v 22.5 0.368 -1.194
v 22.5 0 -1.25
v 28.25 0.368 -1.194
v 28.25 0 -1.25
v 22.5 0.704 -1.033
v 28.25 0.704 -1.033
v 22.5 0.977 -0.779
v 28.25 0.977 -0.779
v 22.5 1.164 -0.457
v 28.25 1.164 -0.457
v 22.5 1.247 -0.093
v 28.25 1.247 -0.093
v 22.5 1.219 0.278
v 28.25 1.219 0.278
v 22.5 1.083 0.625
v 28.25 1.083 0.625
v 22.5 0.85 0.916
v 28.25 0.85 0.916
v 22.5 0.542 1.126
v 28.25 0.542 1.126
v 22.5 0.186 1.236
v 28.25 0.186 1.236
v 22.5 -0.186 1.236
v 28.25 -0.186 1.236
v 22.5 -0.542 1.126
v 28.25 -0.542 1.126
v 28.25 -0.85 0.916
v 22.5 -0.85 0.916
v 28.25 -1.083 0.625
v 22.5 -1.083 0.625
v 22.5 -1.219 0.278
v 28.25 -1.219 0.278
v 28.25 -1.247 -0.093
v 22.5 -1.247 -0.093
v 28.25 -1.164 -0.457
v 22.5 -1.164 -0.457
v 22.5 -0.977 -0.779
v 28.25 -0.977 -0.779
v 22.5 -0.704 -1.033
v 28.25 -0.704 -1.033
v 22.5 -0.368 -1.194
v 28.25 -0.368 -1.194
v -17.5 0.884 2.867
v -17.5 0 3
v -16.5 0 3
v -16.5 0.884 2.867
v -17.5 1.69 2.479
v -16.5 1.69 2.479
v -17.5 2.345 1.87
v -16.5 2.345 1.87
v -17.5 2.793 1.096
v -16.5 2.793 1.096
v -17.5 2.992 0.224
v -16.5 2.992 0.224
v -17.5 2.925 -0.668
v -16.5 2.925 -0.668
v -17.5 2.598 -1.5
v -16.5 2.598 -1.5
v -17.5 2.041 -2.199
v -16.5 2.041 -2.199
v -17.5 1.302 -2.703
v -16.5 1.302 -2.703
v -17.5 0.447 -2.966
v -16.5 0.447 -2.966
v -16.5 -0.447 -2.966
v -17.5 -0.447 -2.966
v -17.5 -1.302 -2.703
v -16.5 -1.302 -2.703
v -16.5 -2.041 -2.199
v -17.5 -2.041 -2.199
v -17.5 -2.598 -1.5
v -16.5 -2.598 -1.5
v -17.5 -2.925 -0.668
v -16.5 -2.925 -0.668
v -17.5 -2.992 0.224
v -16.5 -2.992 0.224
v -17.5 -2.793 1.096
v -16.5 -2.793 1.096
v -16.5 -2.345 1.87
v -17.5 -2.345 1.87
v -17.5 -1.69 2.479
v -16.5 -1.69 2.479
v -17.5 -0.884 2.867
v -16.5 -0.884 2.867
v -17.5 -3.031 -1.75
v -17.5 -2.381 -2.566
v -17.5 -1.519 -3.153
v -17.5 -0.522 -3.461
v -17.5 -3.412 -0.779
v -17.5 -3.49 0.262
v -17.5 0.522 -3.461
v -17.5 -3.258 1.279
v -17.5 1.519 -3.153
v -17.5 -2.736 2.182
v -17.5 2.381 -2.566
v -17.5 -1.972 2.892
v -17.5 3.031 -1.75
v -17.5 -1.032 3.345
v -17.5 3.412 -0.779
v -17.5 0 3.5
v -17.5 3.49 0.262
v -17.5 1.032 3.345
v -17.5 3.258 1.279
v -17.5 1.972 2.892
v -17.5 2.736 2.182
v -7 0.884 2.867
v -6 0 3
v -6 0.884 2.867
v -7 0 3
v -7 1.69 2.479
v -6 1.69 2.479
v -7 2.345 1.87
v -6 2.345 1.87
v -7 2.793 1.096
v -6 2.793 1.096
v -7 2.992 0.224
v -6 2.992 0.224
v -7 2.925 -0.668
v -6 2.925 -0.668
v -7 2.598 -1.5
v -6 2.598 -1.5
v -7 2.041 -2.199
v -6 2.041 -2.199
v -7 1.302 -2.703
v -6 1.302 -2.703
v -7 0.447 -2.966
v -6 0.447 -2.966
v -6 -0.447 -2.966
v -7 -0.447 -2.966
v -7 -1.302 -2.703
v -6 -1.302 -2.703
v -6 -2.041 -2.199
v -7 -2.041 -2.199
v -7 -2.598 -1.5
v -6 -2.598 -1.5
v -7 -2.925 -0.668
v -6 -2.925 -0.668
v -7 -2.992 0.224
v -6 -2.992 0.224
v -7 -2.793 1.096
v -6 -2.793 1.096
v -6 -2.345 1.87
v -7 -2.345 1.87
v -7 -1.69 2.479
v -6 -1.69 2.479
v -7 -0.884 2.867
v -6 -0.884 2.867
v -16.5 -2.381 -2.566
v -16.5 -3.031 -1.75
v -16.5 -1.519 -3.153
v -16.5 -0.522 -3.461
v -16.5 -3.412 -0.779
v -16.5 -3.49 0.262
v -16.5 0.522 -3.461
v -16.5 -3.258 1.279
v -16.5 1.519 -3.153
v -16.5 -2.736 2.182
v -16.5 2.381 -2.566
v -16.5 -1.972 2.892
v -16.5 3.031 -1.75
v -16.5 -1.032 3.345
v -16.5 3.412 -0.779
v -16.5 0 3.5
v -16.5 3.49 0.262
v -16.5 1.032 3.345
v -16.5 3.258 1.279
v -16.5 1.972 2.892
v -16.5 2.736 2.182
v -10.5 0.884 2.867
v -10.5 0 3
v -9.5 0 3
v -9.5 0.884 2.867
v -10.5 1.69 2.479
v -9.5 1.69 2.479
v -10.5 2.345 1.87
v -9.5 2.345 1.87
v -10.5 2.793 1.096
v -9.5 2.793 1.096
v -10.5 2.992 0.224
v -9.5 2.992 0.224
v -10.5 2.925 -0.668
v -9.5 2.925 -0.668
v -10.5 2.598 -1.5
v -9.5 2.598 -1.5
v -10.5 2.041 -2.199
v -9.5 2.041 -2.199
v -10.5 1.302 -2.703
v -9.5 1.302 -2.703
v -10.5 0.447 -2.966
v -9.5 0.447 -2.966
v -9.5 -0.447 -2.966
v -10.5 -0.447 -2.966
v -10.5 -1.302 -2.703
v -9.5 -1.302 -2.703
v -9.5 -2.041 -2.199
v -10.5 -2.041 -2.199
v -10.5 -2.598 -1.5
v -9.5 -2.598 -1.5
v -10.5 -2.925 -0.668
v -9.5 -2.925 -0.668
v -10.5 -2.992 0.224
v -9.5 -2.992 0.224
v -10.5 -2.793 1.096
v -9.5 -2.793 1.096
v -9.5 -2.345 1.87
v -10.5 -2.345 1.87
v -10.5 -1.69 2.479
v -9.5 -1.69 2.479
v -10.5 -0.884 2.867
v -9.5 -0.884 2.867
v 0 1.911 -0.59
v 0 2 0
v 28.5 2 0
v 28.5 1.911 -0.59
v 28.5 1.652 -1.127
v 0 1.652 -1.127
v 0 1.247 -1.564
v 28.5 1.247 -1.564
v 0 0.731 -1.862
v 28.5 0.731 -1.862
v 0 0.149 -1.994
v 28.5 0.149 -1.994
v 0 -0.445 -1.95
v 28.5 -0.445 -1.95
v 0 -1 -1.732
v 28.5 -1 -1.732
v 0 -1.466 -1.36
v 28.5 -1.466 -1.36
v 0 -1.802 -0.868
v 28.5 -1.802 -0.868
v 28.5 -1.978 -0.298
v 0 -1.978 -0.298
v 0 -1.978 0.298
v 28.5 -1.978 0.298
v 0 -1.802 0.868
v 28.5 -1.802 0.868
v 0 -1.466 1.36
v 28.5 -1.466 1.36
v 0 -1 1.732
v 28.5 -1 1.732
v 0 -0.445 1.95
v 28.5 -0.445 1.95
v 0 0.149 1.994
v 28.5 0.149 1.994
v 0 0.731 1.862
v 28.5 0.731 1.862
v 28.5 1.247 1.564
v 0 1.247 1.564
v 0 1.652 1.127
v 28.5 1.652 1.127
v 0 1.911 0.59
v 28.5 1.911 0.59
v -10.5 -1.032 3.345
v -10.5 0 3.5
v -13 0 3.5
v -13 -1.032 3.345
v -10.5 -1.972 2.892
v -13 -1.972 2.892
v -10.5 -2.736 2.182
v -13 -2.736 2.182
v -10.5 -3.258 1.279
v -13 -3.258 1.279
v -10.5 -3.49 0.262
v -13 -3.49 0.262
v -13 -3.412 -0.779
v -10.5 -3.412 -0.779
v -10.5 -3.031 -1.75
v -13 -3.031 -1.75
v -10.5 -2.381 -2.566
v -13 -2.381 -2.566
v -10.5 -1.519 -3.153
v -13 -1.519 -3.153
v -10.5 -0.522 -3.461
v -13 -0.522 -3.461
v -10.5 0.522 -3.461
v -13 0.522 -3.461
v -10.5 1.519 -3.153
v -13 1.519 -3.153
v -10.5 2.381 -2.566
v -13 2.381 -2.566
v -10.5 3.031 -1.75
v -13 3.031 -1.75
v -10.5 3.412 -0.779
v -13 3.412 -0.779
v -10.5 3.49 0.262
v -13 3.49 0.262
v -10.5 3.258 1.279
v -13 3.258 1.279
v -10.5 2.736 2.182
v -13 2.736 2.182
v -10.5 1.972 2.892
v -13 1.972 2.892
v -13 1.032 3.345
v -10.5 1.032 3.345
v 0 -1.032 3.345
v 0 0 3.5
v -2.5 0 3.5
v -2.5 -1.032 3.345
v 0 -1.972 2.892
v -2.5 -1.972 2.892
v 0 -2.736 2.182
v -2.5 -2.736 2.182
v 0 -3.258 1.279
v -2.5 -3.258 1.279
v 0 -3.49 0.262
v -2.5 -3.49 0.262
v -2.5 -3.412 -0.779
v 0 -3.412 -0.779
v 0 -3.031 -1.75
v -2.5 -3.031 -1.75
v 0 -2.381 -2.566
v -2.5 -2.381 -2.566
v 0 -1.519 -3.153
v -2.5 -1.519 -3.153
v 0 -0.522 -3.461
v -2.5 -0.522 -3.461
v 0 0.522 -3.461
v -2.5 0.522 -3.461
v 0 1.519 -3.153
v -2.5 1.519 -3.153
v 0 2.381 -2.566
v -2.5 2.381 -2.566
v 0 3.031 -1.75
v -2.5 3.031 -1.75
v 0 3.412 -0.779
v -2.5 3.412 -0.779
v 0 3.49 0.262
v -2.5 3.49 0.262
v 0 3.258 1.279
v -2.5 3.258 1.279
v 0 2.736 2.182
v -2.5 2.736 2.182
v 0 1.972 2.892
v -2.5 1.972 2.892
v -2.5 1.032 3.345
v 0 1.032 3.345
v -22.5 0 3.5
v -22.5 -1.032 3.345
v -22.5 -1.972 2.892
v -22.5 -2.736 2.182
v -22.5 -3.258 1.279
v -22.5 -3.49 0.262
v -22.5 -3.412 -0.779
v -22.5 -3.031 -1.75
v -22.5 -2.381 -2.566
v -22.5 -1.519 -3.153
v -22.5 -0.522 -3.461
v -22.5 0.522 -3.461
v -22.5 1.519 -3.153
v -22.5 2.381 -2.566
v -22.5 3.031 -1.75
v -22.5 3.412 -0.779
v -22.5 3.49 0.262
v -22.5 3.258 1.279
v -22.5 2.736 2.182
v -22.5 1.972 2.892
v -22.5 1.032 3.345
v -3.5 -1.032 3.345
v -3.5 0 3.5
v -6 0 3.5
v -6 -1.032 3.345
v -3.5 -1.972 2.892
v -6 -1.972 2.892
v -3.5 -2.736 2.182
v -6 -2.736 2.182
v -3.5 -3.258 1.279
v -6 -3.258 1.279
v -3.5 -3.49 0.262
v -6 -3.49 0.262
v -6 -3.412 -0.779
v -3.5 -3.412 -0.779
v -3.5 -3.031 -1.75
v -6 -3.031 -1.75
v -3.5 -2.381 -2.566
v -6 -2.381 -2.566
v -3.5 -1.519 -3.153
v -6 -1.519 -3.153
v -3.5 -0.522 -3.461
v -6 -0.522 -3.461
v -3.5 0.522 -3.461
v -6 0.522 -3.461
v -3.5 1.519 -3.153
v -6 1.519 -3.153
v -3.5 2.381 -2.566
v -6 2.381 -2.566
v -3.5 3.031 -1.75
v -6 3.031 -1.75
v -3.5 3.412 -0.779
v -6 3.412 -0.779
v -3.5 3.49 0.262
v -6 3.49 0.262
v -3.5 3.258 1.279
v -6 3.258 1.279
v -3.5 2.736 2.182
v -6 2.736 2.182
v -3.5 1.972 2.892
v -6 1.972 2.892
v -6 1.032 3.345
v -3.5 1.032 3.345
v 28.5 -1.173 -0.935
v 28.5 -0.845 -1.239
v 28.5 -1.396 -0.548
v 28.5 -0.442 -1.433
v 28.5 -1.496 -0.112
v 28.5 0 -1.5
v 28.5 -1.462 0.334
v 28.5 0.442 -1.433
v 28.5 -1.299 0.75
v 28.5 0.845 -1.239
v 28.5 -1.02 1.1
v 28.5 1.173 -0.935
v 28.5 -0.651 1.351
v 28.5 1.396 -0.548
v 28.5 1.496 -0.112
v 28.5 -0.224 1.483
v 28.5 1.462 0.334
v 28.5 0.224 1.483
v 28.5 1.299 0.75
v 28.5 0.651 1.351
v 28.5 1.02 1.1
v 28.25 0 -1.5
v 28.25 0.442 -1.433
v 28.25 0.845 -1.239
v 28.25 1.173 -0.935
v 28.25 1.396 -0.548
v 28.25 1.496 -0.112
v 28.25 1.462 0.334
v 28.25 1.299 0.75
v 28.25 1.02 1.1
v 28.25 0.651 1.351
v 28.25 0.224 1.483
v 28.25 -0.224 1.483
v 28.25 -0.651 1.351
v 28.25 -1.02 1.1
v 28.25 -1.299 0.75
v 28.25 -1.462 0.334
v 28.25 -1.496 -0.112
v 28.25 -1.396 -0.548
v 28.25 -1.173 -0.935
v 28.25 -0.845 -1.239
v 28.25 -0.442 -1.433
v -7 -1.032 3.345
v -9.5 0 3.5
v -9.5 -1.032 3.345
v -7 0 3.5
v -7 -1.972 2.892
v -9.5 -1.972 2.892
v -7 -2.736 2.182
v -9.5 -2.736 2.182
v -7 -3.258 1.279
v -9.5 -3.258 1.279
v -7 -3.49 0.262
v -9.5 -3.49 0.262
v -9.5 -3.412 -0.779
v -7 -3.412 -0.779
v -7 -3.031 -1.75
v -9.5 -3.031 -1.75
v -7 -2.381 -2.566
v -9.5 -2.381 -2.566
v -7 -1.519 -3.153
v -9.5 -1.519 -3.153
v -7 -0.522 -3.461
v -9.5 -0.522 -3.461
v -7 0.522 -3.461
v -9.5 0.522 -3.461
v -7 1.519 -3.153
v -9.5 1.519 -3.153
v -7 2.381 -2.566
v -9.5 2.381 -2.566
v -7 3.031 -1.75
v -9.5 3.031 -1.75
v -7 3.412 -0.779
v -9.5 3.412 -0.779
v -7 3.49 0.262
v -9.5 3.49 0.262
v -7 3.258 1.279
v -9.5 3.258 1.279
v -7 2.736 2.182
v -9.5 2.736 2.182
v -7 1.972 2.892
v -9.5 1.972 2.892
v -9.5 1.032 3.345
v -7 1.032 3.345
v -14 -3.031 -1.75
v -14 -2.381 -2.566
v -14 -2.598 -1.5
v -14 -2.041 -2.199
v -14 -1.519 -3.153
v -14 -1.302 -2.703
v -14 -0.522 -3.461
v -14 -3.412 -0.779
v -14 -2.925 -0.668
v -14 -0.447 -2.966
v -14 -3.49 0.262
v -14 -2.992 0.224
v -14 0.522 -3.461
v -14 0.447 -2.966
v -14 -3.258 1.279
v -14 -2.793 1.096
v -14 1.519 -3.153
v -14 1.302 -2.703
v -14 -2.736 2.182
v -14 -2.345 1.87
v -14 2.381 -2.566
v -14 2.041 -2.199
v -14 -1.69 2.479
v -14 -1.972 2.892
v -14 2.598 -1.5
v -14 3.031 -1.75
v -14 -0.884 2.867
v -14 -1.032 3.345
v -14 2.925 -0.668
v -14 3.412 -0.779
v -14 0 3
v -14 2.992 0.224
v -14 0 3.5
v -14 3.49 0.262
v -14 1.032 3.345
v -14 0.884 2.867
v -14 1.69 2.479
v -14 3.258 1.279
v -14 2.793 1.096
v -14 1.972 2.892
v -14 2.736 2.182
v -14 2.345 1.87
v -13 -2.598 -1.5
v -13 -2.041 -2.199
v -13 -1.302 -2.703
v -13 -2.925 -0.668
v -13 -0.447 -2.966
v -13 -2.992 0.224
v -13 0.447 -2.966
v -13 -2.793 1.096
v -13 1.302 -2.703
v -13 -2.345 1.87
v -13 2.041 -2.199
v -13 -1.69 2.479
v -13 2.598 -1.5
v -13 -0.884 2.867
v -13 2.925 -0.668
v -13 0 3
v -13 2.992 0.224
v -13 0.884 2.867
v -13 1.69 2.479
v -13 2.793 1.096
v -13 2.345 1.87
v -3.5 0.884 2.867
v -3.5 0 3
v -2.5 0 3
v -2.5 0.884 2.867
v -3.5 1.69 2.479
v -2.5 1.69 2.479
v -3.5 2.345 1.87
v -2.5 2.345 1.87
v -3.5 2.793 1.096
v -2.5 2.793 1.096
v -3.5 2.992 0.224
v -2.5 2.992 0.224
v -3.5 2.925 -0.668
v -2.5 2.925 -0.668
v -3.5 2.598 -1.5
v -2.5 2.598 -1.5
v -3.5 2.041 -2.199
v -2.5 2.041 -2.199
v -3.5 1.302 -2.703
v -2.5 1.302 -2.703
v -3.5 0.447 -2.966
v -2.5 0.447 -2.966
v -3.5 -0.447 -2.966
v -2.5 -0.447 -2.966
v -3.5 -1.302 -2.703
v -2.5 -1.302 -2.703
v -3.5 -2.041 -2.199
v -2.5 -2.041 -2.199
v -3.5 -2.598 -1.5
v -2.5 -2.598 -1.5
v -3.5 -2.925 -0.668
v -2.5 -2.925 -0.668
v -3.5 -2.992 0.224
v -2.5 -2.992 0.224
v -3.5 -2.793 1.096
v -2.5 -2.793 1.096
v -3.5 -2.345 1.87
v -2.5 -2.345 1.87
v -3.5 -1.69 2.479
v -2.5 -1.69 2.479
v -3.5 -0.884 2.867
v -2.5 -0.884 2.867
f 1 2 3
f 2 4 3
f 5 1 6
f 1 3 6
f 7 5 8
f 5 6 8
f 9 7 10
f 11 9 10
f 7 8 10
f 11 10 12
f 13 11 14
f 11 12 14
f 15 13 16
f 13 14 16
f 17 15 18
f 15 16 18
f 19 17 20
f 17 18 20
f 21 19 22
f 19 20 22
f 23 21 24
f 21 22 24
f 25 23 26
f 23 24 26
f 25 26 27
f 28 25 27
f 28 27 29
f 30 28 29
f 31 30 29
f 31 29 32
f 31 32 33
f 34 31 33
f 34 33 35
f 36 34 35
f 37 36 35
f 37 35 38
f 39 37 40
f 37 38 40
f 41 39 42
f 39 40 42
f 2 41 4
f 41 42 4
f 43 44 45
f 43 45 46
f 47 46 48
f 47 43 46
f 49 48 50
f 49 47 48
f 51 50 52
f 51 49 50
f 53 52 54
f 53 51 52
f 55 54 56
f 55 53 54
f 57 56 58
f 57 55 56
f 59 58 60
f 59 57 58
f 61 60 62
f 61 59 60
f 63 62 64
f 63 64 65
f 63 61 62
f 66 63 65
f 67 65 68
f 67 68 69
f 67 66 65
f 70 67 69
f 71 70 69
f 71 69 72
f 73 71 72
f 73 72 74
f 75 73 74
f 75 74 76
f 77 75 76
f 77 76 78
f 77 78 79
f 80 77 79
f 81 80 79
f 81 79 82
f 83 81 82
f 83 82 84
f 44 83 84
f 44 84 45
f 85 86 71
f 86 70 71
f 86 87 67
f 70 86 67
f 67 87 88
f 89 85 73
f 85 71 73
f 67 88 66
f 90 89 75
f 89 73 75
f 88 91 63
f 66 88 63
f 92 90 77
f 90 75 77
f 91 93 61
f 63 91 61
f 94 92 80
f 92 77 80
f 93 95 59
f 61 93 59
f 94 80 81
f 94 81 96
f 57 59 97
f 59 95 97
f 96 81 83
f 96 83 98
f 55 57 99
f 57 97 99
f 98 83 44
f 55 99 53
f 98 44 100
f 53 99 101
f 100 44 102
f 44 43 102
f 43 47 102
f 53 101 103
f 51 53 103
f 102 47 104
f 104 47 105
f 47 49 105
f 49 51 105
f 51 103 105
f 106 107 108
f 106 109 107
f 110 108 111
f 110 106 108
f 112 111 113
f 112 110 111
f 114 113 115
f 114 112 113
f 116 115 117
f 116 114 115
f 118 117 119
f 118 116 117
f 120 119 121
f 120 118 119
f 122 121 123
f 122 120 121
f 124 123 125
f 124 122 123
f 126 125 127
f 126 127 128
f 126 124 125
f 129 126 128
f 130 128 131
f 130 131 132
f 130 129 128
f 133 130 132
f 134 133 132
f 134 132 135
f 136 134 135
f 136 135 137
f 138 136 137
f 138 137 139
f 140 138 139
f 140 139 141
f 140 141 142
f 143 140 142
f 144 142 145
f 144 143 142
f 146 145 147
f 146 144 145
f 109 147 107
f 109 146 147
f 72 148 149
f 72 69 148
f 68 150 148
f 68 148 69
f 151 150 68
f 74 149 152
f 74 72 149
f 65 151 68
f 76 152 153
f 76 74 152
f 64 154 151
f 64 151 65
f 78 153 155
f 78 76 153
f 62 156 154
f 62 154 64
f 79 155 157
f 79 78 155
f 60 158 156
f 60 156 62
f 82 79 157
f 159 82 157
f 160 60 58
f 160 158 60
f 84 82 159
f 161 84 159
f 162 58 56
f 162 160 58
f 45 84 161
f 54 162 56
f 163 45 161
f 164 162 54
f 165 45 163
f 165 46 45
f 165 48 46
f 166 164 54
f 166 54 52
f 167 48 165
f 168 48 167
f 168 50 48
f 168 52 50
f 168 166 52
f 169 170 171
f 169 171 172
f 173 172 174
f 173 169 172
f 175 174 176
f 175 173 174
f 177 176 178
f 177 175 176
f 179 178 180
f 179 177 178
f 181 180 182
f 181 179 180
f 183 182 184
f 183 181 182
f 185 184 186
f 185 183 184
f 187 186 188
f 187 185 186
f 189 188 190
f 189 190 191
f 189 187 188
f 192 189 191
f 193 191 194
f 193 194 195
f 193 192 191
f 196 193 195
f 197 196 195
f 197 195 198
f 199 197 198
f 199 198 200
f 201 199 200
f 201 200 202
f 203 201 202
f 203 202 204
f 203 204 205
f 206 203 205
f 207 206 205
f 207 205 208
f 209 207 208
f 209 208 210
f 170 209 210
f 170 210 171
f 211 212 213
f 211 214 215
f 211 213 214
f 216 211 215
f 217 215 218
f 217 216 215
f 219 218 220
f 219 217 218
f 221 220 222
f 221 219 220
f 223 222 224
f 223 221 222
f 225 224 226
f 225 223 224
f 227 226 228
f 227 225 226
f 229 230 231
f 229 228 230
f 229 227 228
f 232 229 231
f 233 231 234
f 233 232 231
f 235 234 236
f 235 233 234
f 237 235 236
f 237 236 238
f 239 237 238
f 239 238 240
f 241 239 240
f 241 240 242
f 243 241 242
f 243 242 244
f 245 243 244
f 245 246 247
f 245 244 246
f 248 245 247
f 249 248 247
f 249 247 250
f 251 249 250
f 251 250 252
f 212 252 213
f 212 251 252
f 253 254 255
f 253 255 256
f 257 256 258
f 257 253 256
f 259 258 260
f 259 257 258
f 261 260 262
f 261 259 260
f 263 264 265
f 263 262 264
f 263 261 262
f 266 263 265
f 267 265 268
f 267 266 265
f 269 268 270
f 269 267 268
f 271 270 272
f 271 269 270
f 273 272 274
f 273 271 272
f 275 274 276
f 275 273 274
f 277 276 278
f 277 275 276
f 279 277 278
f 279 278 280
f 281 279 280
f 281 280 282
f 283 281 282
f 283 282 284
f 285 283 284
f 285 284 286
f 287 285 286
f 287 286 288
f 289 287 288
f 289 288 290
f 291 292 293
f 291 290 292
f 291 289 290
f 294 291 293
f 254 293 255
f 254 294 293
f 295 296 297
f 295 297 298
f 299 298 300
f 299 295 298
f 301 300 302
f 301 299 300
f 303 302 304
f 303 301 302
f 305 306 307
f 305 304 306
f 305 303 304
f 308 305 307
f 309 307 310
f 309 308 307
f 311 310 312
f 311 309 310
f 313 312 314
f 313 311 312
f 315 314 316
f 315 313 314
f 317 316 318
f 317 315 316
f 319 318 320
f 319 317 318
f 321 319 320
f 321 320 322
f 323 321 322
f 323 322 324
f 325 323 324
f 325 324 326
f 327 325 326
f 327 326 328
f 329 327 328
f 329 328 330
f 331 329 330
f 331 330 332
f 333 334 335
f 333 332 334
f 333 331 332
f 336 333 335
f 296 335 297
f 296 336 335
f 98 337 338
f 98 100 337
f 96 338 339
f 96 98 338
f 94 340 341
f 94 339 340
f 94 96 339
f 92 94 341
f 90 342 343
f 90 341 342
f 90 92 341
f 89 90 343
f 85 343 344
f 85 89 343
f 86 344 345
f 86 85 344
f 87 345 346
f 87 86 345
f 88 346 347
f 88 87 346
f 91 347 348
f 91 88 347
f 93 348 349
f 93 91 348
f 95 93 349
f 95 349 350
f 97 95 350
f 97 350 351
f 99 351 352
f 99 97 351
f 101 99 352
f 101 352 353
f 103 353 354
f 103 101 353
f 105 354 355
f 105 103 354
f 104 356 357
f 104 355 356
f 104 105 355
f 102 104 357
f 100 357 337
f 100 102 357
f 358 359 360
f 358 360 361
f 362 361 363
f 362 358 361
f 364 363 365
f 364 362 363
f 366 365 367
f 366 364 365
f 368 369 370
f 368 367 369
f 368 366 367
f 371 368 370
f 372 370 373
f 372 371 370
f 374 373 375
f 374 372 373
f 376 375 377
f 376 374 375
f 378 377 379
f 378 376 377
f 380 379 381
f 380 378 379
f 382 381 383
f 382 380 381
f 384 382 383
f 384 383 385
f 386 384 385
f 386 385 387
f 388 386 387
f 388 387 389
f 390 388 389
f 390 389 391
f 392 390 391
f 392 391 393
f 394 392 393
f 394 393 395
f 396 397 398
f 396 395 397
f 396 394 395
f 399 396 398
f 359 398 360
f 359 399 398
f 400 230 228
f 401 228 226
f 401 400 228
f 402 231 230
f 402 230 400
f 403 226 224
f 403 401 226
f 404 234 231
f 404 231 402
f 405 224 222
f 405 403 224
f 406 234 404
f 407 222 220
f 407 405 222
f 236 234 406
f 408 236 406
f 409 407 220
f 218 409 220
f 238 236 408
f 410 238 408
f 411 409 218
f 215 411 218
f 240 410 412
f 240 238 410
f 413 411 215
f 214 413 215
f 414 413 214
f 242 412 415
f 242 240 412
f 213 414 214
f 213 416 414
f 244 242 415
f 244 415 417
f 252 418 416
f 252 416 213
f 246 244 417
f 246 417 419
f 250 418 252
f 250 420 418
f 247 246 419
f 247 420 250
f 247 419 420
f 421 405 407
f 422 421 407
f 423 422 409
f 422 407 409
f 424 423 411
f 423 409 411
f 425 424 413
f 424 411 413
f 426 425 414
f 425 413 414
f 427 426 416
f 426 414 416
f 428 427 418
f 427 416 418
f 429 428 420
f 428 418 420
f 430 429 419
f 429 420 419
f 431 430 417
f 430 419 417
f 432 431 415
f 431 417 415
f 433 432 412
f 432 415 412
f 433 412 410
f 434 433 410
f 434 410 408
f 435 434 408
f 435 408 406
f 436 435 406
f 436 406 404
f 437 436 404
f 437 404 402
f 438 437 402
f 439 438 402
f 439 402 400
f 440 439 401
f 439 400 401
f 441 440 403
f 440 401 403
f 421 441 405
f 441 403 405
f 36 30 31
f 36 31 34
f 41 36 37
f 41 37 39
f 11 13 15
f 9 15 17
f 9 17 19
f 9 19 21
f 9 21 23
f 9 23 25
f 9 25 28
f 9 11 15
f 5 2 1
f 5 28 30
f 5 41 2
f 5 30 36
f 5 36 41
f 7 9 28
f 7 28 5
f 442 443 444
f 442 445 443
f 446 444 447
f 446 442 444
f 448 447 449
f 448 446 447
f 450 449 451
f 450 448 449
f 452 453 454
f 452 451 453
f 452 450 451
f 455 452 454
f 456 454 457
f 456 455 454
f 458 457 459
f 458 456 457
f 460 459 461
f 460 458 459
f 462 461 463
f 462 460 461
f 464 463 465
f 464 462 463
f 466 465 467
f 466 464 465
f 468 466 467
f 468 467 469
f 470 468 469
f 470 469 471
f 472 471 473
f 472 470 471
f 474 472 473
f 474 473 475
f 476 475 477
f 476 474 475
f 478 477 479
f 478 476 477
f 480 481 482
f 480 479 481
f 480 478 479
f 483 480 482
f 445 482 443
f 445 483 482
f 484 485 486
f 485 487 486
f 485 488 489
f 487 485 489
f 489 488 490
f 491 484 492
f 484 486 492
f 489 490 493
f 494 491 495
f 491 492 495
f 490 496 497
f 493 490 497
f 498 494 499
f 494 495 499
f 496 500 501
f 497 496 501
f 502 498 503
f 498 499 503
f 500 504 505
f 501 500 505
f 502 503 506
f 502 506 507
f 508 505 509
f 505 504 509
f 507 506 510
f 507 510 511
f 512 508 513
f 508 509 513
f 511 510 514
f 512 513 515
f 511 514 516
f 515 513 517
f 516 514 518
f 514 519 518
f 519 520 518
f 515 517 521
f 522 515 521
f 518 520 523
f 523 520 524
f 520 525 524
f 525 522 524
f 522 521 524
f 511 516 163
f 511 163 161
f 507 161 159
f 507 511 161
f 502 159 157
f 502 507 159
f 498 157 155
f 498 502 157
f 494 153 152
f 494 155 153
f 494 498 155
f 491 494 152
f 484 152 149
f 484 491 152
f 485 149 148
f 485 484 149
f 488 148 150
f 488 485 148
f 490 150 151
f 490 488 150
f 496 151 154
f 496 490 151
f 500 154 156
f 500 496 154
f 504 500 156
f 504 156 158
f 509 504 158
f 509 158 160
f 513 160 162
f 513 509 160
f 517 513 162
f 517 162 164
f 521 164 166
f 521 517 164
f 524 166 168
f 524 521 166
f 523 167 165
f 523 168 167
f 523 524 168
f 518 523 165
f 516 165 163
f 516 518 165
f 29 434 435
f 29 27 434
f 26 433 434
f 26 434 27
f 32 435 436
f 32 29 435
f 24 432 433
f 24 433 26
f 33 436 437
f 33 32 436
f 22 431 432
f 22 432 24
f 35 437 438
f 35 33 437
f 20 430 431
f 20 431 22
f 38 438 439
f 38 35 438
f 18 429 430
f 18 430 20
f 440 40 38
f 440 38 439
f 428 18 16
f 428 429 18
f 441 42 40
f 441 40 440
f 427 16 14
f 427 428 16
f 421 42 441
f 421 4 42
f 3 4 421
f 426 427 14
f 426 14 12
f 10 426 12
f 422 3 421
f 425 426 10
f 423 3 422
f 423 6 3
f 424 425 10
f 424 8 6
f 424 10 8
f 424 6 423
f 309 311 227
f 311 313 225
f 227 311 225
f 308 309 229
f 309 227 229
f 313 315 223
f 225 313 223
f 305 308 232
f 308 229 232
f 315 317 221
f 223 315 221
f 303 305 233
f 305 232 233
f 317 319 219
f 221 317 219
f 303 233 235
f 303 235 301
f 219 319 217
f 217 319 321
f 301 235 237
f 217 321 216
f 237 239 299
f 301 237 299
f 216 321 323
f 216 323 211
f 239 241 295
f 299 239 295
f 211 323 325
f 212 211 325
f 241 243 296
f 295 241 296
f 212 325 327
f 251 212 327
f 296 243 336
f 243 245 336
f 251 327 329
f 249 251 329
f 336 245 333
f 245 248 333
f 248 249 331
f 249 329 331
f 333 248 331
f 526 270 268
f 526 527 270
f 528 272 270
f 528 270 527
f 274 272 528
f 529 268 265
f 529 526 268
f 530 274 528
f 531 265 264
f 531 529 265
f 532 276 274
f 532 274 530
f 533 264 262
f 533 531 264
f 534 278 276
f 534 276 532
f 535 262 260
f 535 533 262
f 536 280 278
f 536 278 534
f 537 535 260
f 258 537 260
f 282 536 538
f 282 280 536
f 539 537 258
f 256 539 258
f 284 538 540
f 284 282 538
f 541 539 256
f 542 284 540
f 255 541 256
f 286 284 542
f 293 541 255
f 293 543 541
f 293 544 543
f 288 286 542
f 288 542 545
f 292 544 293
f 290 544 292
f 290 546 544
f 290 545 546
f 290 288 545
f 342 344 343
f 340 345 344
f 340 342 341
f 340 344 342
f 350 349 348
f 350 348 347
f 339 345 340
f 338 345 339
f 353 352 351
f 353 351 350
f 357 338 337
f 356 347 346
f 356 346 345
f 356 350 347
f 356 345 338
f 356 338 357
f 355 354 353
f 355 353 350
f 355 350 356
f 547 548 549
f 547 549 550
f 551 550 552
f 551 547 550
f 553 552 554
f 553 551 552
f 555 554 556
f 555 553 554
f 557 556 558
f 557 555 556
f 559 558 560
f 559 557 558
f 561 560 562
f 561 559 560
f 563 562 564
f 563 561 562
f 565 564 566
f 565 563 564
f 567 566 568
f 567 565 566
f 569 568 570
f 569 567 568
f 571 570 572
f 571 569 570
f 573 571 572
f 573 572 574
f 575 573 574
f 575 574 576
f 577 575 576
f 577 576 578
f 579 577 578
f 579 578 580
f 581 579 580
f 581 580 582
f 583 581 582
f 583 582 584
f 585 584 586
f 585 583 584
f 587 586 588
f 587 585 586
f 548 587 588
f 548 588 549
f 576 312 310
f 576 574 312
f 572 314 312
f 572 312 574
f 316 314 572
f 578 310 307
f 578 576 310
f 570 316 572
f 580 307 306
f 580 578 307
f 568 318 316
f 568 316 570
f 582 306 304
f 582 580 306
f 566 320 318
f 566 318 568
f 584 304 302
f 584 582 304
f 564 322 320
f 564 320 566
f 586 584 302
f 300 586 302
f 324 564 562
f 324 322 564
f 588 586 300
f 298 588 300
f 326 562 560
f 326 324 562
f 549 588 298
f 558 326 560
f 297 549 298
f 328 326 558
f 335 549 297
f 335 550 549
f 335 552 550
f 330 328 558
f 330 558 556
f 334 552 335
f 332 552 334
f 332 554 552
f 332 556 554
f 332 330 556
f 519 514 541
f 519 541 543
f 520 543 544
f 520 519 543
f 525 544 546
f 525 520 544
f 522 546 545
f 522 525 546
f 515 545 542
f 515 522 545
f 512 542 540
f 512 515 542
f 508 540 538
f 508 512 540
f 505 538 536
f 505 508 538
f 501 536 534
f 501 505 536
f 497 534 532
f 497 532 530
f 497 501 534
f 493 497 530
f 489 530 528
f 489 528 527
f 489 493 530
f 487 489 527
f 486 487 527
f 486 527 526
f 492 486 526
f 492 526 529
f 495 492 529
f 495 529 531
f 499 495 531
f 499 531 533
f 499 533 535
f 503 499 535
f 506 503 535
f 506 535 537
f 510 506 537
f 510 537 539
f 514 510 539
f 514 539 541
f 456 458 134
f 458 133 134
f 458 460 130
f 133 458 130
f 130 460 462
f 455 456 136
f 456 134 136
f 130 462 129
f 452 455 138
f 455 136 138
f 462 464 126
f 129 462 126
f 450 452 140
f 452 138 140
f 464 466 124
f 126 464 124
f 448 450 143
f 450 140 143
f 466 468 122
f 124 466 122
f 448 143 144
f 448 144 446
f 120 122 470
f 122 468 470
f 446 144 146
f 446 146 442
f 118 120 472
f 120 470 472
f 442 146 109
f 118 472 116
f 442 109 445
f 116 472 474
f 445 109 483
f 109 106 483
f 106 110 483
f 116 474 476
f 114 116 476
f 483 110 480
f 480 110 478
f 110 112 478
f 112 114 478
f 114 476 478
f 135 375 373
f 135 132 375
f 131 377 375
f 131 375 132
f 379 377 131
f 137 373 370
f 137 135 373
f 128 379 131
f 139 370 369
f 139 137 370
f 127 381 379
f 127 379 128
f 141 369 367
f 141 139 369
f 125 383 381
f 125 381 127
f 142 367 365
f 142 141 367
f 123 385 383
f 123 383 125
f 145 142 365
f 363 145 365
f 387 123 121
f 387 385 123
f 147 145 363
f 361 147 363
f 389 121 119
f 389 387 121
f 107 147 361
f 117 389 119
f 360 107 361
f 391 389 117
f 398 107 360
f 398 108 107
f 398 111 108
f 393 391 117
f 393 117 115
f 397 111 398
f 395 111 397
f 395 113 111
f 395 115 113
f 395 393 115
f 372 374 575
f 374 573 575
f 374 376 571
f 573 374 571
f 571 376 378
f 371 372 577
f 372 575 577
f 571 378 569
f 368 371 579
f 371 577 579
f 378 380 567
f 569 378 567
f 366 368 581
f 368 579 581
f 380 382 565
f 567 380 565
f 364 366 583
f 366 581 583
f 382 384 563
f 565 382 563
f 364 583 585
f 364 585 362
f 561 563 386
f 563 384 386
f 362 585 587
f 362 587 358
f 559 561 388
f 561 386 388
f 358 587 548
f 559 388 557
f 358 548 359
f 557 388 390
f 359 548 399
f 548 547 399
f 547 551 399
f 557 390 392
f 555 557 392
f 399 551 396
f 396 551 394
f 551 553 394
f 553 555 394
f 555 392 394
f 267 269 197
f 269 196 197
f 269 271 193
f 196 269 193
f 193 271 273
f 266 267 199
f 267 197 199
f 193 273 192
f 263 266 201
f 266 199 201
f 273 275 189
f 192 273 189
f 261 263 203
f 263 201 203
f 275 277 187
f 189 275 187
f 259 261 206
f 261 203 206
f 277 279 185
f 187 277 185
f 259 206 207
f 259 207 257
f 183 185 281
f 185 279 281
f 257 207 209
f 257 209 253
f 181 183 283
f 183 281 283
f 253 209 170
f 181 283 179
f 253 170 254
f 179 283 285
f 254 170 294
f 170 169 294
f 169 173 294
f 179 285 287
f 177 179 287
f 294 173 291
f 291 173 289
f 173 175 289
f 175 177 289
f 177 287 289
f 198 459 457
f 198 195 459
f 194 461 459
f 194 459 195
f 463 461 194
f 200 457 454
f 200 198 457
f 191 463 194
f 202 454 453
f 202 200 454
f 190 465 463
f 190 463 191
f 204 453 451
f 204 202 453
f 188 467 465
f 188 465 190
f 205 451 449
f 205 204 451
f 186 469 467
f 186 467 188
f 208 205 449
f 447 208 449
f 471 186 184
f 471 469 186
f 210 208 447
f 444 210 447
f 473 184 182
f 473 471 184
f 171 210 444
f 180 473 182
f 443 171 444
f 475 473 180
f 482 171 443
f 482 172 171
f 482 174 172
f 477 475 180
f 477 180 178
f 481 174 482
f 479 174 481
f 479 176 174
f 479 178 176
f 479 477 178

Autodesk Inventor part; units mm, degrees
ref_plane "XY Plane" through (0, 0, 0) normal (0, 0, 1) x (1, 0, 0)
sketch "Sketch1" plane through (0, 0, 0) normal (1, 0, 0) x (0, 1, 0)
  circle A0 centre (0, 0) radius 2
  dimension "d0" = 4
extrude "Extrusion1" add sketch "Sketch1" along normal blind 28.5
sketch "Sketch2" plane through (28.5, 0, 0) normal (1, 0, 0) x (0, 0, -1)
  circle A0 centre (0, 0) radius 1.5
  dimension "d3" = 3
extrude "Extrusion2" cut sketch "Sketch2" against normal blind 0.25
sketch "Sketch3" plane through (28.25, 0, 0) normal (1, 0, 0) x (0, 0, -1)
  circle A0 centre (0, 0) radius 1.25
  dimension "d6" = 2.5
extrude "Extrusion3" cut sketch "Sketch3" against normal blind 5.75
sketch "Sketch4" plane through (0, 0, 0) normal (-1, 0, 0) x (0, 0, 1)
  circle A0 centre (0, 0) radius 3.5
  dimension "d9" = 7
extrude "Extrusion4" add sketch "Sketch4" along normal blind 22.5
ref_plane "Work Plane1" through (-17.5, 0, 0) normal (-1, 0, 0) x (0, 0, 1)
sketch "Sketch5" plane through (-17.5, 0, 0) normal (-1, 0, 0) x (0, 0, 1)
  circle A0 centre (0, 0) radius 3
  circle A1 centre (0, 0) radius 3.5
  dimension "d13" = 6
  dimension "d14" = 7
extrude "Extrusion5" cut sketch "Sketch5" against normal blind 1
ref_plane "Work Plane2" through (-14, 0, 0) normal (-1, 0, 0) x (0, 0, 1)
sketch "Sketch7" plane through (-14, 0, 0) normal (-1, 0, 0) x (0, 0, 1)
  circle A0 centre (0, 0) radius 3
  circle A1 centre (0, 0) radius 3.5
  dimension "d18" = 7
  dimension "d19" = 6
extrude "Extrusion6" cut sketch "Sketch7" against normal blind 1
ref_plane "Work Plane3" through (-10.5, 0, 0) normal (-1, 0, 0) x (0, 0, 1)
sketch "Sketch9" plane through (-10.5, 0, 0) normal (-1, 0, 0) x (0, 0, 1)
  circle A0 centre (0, 0) radius 3
  circle A1 centre (0, 0) radius 3.5
  dimension "d25" = 7
  dimension "d26" = 6
extrude "Extrusion7" cut sketch "Sketch9" against normal blind 1
ref_plane "Work Plane4" through (-7, 0, 0) normal (-1, 0, 0) x (0, 0, 1)
sketch "Sketch10" plane through (-7, 0, 0) normal (-1, 0, 0) x (0, 0, 1)
  circle A0 centre (0, 0) radius 3
  circle A1 centre (0, 0) radius 3.5
  dimension "d30" = 7
  dimension "d31" = 6
extrude "Extrusion8" cut sketch "Sketch10" against normal blind 1
ref_plane "Work Plane5" through (-3.5, 0, 0) normal (-1, 0, 0) x (0, 0, 1)
sketch "Sketch11" plane through (-3.5, 0, 0) normal (-1, 0, 0) x (0, 0, 1)
  circle A0 centre (0, 0) radius 2 projected
  circle A1 centre (0, 0) radius 3
  circle A2 centre (0, 0) radius 3.5
  dimension "d35" = 7
  dimension "d36" = 6
extrude "Extrusion9" cut sketch "Sketch11" against normal blind 1 contours A2
